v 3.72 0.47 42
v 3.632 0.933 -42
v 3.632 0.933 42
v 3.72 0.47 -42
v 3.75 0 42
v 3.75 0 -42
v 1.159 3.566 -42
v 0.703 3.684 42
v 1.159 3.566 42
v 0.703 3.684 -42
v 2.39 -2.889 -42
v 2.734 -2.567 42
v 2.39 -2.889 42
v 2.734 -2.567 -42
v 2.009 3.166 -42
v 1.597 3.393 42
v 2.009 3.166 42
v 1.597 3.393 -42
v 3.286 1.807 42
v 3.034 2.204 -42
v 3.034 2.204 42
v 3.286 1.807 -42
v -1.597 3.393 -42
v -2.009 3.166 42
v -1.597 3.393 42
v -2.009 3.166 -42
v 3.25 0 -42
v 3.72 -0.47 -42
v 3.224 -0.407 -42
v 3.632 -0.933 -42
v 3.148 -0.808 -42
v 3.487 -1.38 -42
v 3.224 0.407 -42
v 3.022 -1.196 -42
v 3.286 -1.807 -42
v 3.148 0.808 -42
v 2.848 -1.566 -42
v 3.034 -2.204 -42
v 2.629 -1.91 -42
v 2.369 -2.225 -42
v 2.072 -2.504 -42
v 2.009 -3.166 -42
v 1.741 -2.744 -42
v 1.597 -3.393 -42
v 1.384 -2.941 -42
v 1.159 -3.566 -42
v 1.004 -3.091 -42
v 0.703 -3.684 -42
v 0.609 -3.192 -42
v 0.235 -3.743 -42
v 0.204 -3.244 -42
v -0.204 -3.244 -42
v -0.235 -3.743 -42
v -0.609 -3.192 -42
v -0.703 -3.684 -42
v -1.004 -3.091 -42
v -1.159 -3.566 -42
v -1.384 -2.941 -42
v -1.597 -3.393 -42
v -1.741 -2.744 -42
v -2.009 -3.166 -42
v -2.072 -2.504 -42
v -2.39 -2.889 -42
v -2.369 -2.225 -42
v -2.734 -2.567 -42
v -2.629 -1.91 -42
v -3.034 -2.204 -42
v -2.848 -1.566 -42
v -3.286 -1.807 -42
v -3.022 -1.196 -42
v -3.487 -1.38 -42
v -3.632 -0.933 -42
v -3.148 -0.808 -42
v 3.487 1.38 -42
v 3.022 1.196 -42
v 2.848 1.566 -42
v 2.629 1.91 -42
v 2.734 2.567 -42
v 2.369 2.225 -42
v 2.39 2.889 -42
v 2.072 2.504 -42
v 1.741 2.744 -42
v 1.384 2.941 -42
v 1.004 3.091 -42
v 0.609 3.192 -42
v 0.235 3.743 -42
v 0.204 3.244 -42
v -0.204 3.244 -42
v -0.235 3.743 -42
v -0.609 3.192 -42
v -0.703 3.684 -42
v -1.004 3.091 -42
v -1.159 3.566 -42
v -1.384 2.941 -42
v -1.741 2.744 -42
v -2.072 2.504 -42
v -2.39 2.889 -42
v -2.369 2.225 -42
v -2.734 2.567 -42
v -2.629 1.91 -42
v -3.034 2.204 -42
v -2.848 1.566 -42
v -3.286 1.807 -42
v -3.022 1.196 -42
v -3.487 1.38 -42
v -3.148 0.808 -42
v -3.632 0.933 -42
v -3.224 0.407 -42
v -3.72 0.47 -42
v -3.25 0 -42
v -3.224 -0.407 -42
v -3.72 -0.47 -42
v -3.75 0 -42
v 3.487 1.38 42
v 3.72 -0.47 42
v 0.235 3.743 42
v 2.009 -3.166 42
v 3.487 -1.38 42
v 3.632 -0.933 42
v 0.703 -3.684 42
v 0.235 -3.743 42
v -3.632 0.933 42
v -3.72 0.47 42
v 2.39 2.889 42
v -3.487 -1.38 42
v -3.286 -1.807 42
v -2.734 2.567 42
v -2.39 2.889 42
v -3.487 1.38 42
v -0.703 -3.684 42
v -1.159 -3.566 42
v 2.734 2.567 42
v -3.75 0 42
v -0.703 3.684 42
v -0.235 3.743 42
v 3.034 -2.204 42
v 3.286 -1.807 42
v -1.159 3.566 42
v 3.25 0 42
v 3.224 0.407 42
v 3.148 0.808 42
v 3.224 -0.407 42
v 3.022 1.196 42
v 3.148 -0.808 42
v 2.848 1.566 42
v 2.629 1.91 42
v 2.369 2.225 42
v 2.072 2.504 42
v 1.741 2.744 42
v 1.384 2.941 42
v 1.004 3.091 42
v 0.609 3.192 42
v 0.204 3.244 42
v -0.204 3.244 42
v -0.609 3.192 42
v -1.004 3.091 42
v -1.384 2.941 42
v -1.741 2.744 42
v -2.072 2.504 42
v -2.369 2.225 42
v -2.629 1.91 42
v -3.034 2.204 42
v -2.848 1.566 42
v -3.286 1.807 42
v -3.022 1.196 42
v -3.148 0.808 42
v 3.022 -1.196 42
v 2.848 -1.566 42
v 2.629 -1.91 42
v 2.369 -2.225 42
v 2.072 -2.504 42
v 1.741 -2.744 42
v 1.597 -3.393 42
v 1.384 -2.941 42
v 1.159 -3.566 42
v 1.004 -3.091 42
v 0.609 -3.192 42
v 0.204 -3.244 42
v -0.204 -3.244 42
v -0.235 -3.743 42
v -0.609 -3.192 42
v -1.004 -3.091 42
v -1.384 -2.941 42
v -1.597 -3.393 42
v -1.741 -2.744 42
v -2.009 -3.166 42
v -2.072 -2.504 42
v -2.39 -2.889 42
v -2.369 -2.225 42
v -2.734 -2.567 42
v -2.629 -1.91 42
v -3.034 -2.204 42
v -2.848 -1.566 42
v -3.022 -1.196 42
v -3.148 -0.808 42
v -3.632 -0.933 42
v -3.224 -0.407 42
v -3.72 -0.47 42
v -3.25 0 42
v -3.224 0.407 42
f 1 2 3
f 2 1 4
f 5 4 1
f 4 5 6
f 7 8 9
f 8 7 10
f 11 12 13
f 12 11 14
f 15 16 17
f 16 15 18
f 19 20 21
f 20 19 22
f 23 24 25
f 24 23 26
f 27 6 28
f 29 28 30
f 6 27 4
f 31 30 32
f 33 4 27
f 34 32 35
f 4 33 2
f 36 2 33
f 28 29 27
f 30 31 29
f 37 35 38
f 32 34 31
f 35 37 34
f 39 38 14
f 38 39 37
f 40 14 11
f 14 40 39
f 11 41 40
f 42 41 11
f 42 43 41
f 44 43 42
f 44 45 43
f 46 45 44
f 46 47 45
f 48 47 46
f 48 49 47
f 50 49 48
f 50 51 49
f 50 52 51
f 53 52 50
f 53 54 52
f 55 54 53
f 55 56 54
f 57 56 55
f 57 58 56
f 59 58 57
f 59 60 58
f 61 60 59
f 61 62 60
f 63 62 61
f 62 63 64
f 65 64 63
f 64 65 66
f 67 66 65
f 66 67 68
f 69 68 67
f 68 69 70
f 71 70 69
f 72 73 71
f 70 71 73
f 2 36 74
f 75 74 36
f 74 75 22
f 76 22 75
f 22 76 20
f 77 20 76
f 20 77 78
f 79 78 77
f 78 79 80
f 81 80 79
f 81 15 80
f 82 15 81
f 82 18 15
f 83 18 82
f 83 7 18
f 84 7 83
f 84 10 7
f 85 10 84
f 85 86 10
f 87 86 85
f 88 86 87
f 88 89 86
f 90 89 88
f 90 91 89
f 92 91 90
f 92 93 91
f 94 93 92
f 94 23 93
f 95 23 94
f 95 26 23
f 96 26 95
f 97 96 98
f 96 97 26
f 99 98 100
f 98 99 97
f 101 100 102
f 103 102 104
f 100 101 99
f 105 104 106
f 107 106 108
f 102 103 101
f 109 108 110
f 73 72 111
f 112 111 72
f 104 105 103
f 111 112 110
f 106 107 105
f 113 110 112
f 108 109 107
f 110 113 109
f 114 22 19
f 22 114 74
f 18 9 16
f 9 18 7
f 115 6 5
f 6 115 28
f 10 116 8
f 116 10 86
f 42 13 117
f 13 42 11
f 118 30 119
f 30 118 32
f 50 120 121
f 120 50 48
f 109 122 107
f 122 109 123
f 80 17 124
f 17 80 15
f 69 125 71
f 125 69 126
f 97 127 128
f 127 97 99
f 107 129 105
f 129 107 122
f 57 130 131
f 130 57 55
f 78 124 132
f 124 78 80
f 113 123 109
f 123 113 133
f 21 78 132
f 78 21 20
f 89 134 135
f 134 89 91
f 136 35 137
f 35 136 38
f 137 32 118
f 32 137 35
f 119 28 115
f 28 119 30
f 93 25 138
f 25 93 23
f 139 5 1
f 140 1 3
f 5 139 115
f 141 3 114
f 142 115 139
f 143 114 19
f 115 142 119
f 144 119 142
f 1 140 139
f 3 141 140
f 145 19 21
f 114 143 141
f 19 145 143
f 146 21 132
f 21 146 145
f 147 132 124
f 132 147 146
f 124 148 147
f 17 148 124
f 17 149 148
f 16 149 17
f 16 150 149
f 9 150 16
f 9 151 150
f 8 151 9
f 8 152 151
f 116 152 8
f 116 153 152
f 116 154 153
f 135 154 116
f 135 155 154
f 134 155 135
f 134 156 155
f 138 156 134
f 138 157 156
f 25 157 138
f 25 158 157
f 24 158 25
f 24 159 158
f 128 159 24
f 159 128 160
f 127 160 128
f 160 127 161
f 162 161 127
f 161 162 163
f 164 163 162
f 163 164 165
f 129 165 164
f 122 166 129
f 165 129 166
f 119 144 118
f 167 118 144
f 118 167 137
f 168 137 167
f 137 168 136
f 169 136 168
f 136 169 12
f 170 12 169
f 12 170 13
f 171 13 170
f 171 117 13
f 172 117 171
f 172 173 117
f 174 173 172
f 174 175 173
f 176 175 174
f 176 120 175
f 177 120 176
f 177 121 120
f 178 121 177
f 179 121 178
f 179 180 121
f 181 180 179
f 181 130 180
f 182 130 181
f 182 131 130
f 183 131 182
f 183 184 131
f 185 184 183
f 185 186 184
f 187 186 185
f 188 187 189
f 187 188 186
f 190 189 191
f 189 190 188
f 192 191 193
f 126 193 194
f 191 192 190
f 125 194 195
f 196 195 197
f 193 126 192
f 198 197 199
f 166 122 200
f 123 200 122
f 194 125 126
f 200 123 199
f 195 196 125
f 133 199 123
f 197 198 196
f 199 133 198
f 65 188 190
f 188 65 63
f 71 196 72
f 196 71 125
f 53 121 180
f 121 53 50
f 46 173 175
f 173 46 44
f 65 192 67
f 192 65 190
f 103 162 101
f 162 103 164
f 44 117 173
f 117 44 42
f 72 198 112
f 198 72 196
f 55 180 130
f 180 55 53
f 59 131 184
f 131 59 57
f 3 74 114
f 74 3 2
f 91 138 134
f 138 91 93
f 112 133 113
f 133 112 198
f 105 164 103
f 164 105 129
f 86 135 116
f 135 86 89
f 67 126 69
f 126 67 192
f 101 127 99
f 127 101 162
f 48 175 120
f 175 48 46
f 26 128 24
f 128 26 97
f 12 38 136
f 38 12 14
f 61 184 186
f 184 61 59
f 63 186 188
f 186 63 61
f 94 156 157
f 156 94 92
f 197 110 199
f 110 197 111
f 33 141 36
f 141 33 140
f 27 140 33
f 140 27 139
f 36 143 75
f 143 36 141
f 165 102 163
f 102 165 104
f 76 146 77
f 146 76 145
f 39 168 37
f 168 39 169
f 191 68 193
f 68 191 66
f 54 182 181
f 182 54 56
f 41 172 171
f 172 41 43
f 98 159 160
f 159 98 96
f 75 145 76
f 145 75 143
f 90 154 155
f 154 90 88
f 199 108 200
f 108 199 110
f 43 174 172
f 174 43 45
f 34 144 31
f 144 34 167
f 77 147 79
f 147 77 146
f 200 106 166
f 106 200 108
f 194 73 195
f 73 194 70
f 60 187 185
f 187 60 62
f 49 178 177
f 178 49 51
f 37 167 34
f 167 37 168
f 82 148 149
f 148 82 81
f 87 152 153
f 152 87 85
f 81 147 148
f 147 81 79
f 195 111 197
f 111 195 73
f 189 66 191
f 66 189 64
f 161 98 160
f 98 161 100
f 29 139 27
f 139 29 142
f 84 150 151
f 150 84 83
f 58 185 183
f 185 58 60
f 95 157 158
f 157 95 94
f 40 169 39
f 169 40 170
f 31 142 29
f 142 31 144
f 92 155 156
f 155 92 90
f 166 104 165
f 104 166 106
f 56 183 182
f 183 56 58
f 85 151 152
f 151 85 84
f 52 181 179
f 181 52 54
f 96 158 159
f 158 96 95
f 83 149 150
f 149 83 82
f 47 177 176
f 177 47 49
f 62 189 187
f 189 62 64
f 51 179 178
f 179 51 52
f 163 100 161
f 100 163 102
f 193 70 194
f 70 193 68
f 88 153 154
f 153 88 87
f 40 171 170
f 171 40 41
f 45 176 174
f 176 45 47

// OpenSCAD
$fn = 50;


difference() {
	union() {
		translate(v = [0, 0, -42.0000000000]) {
			cylinder(h = 84, r = 3.7500000000);
		}
	}
	union() {
		translate(v = [0, 0, -100.0000000000]) {
			cylinder(h = 200, r = 3.2500000000);
		}
	}
}
